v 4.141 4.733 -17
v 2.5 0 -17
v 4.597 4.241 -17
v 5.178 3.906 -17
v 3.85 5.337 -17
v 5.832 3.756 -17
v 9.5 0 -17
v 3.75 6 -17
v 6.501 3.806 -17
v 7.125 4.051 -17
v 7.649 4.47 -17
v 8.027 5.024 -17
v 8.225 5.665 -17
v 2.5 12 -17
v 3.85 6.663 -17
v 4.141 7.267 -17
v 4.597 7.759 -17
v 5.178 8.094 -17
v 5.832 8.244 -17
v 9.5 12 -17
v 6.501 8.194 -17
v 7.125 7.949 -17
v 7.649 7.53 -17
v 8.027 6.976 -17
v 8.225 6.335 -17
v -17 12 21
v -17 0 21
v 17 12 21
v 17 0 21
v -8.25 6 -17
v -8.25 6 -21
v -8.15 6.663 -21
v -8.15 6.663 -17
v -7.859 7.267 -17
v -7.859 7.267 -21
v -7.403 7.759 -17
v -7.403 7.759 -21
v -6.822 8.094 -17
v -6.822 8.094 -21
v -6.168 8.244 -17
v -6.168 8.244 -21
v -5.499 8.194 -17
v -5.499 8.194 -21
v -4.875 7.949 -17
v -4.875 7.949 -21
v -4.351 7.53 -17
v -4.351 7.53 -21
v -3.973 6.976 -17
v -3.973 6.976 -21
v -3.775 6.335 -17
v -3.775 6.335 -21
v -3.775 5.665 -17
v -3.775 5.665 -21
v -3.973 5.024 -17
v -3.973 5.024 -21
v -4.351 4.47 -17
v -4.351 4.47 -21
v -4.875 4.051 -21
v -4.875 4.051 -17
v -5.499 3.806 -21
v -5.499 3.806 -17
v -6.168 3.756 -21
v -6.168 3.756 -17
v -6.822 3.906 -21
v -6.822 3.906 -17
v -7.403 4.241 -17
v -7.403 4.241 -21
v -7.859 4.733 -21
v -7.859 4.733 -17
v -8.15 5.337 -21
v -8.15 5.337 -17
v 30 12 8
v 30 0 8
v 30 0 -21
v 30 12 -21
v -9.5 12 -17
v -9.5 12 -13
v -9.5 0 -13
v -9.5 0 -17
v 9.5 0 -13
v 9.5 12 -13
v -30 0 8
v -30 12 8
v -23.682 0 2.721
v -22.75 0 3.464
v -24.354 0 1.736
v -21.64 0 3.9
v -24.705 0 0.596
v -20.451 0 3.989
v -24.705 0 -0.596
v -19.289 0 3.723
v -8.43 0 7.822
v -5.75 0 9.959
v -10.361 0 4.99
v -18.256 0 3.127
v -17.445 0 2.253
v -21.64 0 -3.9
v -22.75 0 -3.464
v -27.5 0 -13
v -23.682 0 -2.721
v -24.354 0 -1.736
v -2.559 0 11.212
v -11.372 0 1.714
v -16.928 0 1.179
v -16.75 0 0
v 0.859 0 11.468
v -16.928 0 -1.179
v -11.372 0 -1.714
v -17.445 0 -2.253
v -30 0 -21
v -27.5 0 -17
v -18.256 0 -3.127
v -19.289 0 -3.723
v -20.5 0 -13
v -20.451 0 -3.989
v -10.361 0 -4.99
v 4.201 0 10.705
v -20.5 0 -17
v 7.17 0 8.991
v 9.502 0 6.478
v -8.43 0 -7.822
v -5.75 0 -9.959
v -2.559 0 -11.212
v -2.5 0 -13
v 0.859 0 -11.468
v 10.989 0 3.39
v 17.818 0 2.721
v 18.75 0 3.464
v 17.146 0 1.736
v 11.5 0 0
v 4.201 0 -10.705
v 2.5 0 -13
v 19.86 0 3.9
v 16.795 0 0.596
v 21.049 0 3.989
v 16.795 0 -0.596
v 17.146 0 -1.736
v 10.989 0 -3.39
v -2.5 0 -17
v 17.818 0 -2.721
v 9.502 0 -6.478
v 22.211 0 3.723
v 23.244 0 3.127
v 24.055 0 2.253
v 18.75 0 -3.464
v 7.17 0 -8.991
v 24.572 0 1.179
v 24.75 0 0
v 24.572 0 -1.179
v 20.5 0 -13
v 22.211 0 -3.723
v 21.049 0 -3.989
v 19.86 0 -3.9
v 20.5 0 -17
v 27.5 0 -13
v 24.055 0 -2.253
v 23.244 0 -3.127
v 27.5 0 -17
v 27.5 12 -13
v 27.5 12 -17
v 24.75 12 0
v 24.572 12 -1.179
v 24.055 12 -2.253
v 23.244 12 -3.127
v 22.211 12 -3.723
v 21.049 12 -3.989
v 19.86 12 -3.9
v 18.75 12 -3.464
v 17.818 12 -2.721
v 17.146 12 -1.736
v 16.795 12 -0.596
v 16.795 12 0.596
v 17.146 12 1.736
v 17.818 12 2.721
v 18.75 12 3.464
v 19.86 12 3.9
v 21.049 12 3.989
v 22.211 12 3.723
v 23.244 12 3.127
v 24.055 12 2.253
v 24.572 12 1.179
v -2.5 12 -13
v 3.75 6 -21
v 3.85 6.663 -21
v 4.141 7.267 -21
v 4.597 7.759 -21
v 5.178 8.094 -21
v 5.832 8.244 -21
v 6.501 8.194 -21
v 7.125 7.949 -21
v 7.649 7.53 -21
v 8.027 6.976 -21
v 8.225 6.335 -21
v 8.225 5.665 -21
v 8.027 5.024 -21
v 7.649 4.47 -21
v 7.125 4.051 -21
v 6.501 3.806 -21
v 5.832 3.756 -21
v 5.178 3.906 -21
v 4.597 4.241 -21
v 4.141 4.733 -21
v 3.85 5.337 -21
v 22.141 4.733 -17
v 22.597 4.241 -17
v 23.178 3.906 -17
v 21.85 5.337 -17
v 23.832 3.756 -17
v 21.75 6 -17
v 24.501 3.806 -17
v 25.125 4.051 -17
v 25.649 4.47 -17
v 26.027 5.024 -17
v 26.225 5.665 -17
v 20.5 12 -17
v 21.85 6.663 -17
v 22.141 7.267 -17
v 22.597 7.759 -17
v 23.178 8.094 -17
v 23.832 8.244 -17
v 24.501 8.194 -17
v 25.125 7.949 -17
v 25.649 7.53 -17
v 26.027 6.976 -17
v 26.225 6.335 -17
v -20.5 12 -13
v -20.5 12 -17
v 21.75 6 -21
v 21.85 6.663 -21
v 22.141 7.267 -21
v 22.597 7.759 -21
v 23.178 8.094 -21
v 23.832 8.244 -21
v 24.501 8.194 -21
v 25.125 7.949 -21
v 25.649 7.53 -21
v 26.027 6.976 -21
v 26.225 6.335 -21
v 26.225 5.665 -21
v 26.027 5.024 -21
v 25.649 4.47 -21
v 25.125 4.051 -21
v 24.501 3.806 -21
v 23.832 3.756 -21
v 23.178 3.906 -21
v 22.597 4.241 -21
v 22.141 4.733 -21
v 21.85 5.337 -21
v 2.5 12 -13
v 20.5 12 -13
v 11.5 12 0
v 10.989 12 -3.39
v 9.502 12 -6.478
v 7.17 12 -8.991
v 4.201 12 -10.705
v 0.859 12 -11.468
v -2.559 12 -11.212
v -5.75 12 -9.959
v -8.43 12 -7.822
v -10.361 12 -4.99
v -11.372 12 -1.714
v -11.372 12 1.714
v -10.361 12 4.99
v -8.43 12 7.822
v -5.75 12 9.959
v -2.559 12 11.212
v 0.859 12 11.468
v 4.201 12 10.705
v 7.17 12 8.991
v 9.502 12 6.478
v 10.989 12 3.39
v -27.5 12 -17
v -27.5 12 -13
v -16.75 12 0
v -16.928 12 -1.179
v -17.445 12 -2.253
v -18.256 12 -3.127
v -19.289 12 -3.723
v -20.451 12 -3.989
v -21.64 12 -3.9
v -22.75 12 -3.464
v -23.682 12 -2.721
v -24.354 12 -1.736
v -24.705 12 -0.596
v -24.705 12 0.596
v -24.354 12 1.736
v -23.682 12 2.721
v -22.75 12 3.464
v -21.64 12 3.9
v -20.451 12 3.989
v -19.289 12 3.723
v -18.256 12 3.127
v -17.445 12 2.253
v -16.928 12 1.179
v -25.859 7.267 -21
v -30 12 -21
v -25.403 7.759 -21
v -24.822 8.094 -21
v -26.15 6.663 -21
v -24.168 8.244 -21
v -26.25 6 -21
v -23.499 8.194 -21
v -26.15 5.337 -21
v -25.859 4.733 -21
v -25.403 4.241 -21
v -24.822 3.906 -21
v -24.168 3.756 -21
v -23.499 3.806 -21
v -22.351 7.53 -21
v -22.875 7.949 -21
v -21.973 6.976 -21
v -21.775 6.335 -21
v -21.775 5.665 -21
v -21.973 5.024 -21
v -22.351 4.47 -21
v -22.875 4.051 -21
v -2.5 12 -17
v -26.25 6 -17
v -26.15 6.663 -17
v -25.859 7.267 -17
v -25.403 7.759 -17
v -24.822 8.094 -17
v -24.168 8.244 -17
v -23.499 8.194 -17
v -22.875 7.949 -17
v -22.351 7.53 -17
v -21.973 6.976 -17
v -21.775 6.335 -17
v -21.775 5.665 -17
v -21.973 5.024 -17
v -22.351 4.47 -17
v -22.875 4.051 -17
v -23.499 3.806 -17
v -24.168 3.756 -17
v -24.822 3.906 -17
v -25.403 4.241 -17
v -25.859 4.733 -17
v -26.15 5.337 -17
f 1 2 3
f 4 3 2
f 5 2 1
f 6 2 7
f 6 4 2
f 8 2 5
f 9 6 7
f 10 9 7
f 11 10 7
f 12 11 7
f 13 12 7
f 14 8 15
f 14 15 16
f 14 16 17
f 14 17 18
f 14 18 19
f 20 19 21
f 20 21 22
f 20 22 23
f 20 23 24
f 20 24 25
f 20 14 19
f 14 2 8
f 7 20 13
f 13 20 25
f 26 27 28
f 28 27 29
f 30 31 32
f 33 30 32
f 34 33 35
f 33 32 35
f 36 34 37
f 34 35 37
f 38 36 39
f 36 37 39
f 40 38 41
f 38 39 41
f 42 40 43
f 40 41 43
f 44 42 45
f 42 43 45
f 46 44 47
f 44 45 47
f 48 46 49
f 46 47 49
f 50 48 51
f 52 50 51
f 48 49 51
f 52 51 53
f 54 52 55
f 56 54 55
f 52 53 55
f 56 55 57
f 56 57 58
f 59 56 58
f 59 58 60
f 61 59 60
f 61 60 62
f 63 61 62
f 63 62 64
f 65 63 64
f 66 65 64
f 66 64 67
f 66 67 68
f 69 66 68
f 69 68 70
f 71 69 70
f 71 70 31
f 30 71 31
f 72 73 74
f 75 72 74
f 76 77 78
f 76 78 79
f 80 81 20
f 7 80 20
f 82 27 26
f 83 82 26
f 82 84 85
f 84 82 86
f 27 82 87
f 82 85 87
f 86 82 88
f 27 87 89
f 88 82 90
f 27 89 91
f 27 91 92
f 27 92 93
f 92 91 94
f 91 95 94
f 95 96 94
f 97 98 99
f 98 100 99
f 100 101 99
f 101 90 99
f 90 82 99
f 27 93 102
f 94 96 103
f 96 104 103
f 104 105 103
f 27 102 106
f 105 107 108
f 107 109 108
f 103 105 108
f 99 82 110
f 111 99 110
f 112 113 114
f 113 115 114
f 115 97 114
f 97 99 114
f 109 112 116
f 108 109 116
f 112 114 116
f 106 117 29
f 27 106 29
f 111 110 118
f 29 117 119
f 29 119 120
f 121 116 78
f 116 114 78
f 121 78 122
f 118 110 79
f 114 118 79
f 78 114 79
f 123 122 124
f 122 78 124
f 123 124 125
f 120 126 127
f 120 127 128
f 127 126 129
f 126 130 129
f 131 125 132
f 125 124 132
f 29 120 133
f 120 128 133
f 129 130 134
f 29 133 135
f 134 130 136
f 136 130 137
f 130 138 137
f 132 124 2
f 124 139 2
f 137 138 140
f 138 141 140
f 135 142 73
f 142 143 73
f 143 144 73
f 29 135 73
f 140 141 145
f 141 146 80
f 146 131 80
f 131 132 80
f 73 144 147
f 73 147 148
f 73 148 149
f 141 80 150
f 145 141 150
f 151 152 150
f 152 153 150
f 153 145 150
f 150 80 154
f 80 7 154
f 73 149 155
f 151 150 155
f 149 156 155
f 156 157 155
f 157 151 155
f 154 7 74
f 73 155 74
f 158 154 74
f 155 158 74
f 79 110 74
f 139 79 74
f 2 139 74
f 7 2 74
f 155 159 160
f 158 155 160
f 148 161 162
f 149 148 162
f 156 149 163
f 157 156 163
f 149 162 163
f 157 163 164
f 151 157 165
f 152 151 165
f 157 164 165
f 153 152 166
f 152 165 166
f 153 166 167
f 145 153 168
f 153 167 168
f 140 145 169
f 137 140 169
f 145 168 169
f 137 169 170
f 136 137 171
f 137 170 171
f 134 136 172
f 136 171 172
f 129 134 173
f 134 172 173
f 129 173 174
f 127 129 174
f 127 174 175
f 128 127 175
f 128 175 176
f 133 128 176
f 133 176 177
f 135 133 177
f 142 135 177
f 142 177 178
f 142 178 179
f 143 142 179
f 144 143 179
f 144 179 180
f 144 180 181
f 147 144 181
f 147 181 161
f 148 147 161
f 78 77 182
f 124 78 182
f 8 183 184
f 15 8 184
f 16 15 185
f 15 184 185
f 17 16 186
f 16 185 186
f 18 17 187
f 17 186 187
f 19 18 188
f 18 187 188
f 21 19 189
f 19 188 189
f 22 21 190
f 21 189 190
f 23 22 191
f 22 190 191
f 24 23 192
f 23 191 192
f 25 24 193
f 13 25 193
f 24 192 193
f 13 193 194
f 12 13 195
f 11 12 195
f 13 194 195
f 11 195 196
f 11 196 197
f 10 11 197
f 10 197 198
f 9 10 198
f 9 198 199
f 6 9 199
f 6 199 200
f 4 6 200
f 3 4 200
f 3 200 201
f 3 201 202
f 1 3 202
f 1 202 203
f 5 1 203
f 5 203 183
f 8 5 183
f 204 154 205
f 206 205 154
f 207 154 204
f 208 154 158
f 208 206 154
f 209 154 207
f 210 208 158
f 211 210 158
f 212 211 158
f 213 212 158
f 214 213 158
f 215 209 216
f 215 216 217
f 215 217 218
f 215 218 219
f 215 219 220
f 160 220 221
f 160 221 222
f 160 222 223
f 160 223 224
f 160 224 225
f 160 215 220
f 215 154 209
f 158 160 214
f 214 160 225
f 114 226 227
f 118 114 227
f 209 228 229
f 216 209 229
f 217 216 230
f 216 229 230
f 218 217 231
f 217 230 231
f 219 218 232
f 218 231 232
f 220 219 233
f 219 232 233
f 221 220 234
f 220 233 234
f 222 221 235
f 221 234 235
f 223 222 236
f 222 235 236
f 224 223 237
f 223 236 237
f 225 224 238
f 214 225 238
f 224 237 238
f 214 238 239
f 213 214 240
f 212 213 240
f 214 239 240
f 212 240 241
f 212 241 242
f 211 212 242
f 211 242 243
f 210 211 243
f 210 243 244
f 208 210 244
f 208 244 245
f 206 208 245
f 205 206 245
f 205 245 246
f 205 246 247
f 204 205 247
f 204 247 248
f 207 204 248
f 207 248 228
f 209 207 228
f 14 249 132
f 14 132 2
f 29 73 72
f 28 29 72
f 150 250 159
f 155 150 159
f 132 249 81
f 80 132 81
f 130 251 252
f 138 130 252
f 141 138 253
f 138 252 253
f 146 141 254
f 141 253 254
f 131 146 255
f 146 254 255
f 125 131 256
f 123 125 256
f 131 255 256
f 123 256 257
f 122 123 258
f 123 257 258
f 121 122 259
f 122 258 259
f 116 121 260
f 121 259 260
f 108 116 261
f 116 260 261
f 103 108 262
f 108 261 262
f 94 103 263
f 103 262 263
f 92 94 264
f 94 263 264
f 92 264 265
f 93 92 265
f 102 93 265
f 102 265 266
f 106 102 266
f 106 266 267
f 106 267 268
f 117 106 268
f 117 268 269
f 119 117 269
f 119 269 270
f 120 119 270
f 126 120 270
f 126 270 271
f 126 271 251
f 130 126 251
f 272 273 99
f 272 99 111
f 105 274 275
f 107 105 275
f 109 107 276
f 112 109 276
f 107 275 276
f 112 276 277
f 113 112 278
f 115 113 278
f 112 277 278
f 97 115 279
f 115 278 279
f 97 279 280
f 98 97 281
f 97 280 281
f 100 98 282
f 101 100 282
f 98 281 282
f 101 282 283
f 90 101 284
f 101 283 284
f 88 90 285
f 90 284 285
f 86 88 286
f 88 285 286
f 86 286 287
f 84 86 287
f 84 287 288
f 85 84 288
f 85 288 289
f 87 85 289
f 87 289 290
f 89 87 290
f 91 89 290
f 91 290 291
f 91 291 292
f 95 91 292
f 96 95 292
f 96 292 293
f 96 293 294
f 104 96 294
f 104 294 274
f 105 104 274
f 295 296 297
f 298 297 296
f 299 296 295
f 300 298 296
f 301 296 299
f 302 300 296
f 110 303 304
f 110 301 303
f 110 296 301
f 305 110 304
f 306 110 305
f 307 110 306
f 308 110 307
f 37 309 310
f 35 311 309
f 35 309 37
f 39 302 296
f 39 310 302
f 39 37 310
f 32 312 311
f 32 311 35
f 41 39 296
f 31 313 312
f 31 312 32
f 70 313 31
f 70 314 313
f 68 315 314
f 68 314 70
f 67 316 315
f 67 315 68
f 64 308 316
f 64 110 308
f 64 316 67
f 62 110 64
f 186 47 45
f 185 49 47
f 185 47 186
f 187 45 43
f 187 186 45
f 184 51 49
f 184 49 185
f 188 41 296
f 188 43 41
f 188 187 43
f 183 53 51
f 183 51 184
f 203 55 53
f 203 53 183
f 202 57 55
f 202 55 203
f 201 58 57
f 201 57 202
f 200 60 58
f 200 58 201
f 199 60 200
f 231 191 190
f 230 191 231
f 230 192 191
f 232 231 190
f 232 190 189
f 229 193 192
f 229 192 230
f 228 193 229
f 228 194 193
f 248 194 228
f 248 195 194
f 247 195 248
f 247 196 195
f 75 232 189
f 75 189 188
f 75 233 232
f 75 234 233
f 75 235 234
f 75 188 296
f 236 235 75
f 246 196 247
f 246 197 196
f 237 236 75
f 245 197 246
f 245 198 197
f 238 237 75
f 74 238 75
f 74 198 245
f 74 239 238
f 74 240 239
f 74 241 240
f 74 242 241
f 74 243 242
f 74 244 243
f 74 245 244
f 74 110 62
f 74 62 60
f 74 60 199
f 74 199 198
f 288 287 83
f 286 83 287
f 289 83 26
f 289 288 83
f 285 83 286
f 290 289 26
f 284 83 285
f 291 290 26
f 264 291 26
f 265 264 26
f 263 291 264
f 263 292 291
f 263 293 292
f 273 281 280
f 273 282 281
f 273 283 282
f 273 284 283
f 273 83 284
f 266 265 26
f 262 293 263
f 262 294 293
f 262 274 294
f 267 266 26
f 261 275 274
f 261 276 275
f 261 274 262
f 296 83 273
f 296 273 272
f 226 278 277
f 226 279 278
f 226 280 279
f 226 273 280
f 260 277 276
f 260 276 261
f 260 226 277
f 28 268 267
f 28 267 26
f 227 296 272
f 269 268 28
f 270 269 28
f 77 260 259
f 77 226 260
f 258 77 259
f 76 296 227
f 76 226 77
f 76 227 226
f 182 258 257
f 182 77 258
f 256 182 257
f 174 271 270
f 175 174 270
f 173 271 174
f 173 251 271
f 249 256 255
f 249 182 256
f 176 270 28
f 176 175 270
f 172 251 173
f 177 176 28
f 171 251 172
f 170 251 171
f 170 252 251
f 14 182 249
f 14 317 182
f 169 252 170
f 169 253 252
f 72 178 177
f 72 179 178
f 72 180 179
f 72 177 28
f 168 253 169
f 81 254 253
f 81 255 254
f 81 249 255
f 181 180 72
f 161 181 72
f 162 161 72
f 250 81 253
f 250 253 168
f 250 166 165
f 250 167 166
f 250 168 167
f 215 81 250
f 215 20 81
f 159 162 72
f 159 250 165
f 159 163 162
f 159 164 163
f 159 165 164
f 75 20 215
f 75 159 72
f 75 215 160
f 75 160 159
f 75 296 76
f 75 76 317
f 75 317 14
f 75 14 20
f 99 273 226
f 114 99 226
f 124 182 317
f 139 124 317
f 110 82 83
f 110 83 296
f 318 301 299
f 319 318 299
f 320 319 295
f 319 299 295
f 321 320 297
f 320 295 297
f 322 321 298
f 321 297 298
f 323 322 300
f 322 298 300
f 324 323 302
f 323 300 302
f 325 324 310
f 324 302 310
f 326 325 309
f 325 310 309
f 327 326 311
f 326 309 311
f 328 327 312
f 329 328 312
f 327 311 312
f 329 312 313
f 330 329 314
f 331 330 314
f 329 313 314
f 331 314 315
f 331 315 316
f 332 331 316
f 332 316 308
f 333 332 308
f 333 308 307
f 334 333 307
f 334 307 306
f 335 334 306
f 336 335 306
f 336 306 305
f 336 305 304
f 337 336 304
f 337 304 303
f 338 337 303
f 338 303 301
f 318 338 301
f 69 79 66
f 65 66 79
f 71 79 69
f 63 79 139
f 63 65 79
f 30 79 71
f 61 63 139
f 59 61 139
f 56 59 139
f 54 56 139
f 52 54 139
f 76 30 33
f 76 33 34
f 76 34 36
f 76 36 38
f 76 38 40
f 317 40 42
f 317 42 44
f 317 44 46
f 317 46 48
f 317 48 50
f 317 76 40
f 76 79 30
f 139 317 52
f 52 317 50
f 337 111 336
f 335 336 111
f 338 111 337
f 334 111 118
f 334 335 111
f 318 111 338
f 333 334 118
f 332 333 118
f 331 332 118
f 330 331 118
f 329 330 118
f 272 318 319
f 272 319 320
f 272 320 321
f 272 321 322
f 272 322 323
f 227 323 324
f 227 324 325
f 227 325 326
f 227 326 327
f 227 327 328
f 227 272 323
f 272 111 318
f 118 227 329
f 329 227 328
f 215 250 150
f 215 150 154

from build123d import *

# Parameters (mm, degrees)
SKETCH1_W                      = 60
SKETCH1_H                      = 42
BOSS_EXTRUDE1_DEPTH            = 12
CUT_EXTRUDE2_REACH             = 14
SKETCH3_R                      = 11.5
SKETCH3_R_2                    = 4
CUT_EXTRUDE2_DIRECTION_2_DEPTH = 1
CHAMFER1_SIZE                  = 13
CUT_EXTRUDE4_REACH             = 14
SKETCH5_W                      = 7
SKETCH5_H                      = 4
CUT_EXTRUDE4_DIRECTION_2_DEPTH = 1
SKETCH4_R                      = 2.25
CUT_EXTRUDE3_DEPTH             = 7.5


with BuildPart() as part:
    # Sketch1 → Boss-Extrude1 (new body)
    with BuildSketch(Plane(origin=(0, 0, 0), x_dir=(1, 0, 0), z_dir=(0, 1, 0))):
        Rectangle(SKETCH1_W, SKETCH1_H)
    extrude(amount=BOSS_EXTRUDE1_DEPTH)

    # Sketch3 → Cut-Extrude2 (cut, up to next)
    with BuildSketch(Plane(origin=(0, 12, 0), x_dir=(1, 0, 0), z_dir=(0, 1, 0)), mode=Mode.PRIVATE) as cut_extrude2_sk1:
        Circle(SKETCH3_R)
    cut_extrude2_tool1 = extrude(cut_extrude2_sk1.sketch, amount=-CUT_EXTRUDE2_REACH, mode=Mode.PRIVATE) & part.part
    add(cut_extrude2_tool1.solids().sort_by_distance((0, 12, 0))[0], mode=Mode.SUBTRACT)
    # Sketch3 → Cut-Extrude2 (cut, up to next)
    with BuildSketch(Plane(origin=(0, 12, 0), x_dir=(1, 0, 0), z_dir=(0, 1, 0)), mode=Mode.PRIVATE) as cut_extrude2_sk2:
        with Locations((20.75, 0)):
            Circle(SKETCH3_R_2)
    cut_extrude2_tool2 = extrude(cut_extrude2_sk2.sketch, amount=-CUT_EXTRUDE2_REACH, mode=Mode.PRIVATE) & part.part
    add(cut_extrude2_tool2.solids().sort_by_distance((20.75, 12, 0))[0], mode=Mode.SUBTRACT)
    # Sketch3 → Cut-Extrude2 (cut, up to next)
    with BuildSketch(Plane(origin=(0, 12, 0), x_dir=(1, 0, 0), z_dir=(0, 1, 0)), mode=Mode.PRIVATE) as cut_extrude2_sk3:
        with Locations((-20.75, 0)):
            Circle(SKETCH3_R_2)
    cut_extrude2_tool3 = extrude(cut_extrude2_sk3.sketch, amount=-CUT_EXTRUDE2_REACH, mode=Mode.PRIVATE) & part.part
    add(cut_extrude2_tool3.solids().sort_by_distance((-20.75, 12, 0))[0], mode=Mode.SUBTRACT)

    # Sketch3 → Cut-Extrude2 direction 2 (cut)
    with BuildSketch(Plane(origin=(0, 12, 0), x_dir=(1, 0, 0), z_dir=(0, 1, 0))):
        Circle(SKETCH3_R)
        with Locations((20.75, 0)):
            Circle(SKETCH3_R_2)
        with Locations((-20.75, 0)):
            Circle(SKETCH3_R_2)
    extrude(amount=CUT_EXTRUDE2_DIRECTION_2_DEPTH, mode=Mode.SUBTRACT)

    # Chamfer1
    chamfer1_edges = [part.edges().sort_by_distance(p)[0] for p in [
        (30, 6, 21),
        (-30, 6, 21),
    ]]
    chamfer(chamfer1_edges, length=CHAMFER1_SIZE)

    # Sketch5 → Cut-Extrude4 (cut, up to next)
    with BuildSketch(Plane(origin=(0, 12, 0), x_dir=(1, 0, 0), z_dir=(0, 1, 0)), mode=Mode.PRIVATE) as cut_extrude4_sk1:
        with Locations((24, 15)):
            Rectangle(SKETCH5_W, SKETCH5_H)
    cut_extrude4_tool1 = extrude(cut_extrude4_sk1.sketch, amount=-CUT_EXTRUDE4_REACH, mode=Mode.PRIVATE) & part.part
    add(cut_extrude4_tool1.solids().sort_by_distance((24, 12, -15))[0], mode=Mode.SUBTRACT)
    # Sketch5 → Cut-Extrude4 (cut, up to next)
    with BuildSketch(Plane(origin=(0, 12, 0), x_dir=(1, 0, 0), z_dir=(0, 1, 0)), mode=Mode.PRIVATE) as cut_extrude4_sk2:
        with Locations((6, 15)):
            Rectangle(SKETCH5_W, SKETCH5_H)
    cut_extrude4_tool2 = extrude(cut_extrude4_sk2.sketch, amount=-CUT_EXTRUDE4_REACH, mode=Mode.PRIVATE) & part.part
    add(cut_extrude4_tool2.solids().sort_by_distance((6, 12, -15))[0], mode=Mode.SUBTRACT)
    # Sketch5 → Cut-Extrude4 (cut, up to next)
    with BuildSketch(Plane(origin=(0, 12, 0), x_dir=(1, 0, 0), z_dir=(0, 1, 0)), mode=Mode.PRIVATE) as cut_extrude4_sk3:
        with Locations((-6, 15)):
            Rectangle(SKETCH5_W, SKETCH5_H)
    cut_extrude4_tool3 = extrude(cut_extrude4_sk3.sketch, amount=-CUT_EXTRUDE4_REACH, mode=Mode.PRIVATE) & part.part
    add(cut_extrude4_tool3.solids().sort_by_distance((-6, 12, -15))[0], mode=Mode.SUBTRACT)
    # Sketch5 → Cut-Extrude4 (cut, up to next)
    with BuildSketch(Plane(origin=(0, 12, 0), x_dir=(1, 0, 0), z_dir=(0, 1, 0)), mode=Mode.PRIVATE) as cut_extrude4_sk4:
        with Locations((-24, 15)):
            Rectangle(SKETCH5_W, SKETCH5_H)
    cut_extrude4_tool4 = extrude(cut_extrude4_sk4.sketch, amount=-CUT_EXTRUDE4_REACH, mode=Mode.PRIVATE) & part.part
    add(cut_extrude4_tool4.solids().sort_by_distance((-24, 12, -15))[0], mode=Mode.SUBTRACT)

    # Sketch5 → Cut-Extrude4 direction 2 (cut)
    with BuildSketch(Plane(origin=(0, 12, 0), x_dir=(1, 0, 0), z_dir=(0, 1, 0))):
        with Locations((24, 15)):
            Rectangle(SKETCH5_W, SKETCH5_H)
        with Locations((6, 15)):
            Rectangle(SKETCH5_W, SKETCH5_H)
        with Locations((-6, 15)):
            Rectangle(SKETCH5_W, SKETCH5_H)
        with Locations((-24, 15)):
            Rectangle(SKETCH5_W, SKETCH5_H)
    extrude(amount=CUT_EXTRUDE4_DIRECTION_2_DEPTH, mode=Mode.SUBTRACT)

    # Sketch4 → Cut-Extrude3 (cut)
    with BuildSketch(Plane(origin=(0, 0, -21), x_dir=(-1, 0, 0), z_dir=(0, 0, -1))):
        with Locations((-24, 6)):
            Circle(SKETCH4_R)
        with Locations((-6, 6)):
            Circle(SKETCH4_R)
        with Locations((6, 6)):
            Circle(SKETCH4_R)
        with Locations((24, 6)):
            Circle(SKETCH4_R)
    extrude(amount=-CUT_EXTRUDE3_DEPTH, mode=Mode.SUBTRACT)


solid = part.part
